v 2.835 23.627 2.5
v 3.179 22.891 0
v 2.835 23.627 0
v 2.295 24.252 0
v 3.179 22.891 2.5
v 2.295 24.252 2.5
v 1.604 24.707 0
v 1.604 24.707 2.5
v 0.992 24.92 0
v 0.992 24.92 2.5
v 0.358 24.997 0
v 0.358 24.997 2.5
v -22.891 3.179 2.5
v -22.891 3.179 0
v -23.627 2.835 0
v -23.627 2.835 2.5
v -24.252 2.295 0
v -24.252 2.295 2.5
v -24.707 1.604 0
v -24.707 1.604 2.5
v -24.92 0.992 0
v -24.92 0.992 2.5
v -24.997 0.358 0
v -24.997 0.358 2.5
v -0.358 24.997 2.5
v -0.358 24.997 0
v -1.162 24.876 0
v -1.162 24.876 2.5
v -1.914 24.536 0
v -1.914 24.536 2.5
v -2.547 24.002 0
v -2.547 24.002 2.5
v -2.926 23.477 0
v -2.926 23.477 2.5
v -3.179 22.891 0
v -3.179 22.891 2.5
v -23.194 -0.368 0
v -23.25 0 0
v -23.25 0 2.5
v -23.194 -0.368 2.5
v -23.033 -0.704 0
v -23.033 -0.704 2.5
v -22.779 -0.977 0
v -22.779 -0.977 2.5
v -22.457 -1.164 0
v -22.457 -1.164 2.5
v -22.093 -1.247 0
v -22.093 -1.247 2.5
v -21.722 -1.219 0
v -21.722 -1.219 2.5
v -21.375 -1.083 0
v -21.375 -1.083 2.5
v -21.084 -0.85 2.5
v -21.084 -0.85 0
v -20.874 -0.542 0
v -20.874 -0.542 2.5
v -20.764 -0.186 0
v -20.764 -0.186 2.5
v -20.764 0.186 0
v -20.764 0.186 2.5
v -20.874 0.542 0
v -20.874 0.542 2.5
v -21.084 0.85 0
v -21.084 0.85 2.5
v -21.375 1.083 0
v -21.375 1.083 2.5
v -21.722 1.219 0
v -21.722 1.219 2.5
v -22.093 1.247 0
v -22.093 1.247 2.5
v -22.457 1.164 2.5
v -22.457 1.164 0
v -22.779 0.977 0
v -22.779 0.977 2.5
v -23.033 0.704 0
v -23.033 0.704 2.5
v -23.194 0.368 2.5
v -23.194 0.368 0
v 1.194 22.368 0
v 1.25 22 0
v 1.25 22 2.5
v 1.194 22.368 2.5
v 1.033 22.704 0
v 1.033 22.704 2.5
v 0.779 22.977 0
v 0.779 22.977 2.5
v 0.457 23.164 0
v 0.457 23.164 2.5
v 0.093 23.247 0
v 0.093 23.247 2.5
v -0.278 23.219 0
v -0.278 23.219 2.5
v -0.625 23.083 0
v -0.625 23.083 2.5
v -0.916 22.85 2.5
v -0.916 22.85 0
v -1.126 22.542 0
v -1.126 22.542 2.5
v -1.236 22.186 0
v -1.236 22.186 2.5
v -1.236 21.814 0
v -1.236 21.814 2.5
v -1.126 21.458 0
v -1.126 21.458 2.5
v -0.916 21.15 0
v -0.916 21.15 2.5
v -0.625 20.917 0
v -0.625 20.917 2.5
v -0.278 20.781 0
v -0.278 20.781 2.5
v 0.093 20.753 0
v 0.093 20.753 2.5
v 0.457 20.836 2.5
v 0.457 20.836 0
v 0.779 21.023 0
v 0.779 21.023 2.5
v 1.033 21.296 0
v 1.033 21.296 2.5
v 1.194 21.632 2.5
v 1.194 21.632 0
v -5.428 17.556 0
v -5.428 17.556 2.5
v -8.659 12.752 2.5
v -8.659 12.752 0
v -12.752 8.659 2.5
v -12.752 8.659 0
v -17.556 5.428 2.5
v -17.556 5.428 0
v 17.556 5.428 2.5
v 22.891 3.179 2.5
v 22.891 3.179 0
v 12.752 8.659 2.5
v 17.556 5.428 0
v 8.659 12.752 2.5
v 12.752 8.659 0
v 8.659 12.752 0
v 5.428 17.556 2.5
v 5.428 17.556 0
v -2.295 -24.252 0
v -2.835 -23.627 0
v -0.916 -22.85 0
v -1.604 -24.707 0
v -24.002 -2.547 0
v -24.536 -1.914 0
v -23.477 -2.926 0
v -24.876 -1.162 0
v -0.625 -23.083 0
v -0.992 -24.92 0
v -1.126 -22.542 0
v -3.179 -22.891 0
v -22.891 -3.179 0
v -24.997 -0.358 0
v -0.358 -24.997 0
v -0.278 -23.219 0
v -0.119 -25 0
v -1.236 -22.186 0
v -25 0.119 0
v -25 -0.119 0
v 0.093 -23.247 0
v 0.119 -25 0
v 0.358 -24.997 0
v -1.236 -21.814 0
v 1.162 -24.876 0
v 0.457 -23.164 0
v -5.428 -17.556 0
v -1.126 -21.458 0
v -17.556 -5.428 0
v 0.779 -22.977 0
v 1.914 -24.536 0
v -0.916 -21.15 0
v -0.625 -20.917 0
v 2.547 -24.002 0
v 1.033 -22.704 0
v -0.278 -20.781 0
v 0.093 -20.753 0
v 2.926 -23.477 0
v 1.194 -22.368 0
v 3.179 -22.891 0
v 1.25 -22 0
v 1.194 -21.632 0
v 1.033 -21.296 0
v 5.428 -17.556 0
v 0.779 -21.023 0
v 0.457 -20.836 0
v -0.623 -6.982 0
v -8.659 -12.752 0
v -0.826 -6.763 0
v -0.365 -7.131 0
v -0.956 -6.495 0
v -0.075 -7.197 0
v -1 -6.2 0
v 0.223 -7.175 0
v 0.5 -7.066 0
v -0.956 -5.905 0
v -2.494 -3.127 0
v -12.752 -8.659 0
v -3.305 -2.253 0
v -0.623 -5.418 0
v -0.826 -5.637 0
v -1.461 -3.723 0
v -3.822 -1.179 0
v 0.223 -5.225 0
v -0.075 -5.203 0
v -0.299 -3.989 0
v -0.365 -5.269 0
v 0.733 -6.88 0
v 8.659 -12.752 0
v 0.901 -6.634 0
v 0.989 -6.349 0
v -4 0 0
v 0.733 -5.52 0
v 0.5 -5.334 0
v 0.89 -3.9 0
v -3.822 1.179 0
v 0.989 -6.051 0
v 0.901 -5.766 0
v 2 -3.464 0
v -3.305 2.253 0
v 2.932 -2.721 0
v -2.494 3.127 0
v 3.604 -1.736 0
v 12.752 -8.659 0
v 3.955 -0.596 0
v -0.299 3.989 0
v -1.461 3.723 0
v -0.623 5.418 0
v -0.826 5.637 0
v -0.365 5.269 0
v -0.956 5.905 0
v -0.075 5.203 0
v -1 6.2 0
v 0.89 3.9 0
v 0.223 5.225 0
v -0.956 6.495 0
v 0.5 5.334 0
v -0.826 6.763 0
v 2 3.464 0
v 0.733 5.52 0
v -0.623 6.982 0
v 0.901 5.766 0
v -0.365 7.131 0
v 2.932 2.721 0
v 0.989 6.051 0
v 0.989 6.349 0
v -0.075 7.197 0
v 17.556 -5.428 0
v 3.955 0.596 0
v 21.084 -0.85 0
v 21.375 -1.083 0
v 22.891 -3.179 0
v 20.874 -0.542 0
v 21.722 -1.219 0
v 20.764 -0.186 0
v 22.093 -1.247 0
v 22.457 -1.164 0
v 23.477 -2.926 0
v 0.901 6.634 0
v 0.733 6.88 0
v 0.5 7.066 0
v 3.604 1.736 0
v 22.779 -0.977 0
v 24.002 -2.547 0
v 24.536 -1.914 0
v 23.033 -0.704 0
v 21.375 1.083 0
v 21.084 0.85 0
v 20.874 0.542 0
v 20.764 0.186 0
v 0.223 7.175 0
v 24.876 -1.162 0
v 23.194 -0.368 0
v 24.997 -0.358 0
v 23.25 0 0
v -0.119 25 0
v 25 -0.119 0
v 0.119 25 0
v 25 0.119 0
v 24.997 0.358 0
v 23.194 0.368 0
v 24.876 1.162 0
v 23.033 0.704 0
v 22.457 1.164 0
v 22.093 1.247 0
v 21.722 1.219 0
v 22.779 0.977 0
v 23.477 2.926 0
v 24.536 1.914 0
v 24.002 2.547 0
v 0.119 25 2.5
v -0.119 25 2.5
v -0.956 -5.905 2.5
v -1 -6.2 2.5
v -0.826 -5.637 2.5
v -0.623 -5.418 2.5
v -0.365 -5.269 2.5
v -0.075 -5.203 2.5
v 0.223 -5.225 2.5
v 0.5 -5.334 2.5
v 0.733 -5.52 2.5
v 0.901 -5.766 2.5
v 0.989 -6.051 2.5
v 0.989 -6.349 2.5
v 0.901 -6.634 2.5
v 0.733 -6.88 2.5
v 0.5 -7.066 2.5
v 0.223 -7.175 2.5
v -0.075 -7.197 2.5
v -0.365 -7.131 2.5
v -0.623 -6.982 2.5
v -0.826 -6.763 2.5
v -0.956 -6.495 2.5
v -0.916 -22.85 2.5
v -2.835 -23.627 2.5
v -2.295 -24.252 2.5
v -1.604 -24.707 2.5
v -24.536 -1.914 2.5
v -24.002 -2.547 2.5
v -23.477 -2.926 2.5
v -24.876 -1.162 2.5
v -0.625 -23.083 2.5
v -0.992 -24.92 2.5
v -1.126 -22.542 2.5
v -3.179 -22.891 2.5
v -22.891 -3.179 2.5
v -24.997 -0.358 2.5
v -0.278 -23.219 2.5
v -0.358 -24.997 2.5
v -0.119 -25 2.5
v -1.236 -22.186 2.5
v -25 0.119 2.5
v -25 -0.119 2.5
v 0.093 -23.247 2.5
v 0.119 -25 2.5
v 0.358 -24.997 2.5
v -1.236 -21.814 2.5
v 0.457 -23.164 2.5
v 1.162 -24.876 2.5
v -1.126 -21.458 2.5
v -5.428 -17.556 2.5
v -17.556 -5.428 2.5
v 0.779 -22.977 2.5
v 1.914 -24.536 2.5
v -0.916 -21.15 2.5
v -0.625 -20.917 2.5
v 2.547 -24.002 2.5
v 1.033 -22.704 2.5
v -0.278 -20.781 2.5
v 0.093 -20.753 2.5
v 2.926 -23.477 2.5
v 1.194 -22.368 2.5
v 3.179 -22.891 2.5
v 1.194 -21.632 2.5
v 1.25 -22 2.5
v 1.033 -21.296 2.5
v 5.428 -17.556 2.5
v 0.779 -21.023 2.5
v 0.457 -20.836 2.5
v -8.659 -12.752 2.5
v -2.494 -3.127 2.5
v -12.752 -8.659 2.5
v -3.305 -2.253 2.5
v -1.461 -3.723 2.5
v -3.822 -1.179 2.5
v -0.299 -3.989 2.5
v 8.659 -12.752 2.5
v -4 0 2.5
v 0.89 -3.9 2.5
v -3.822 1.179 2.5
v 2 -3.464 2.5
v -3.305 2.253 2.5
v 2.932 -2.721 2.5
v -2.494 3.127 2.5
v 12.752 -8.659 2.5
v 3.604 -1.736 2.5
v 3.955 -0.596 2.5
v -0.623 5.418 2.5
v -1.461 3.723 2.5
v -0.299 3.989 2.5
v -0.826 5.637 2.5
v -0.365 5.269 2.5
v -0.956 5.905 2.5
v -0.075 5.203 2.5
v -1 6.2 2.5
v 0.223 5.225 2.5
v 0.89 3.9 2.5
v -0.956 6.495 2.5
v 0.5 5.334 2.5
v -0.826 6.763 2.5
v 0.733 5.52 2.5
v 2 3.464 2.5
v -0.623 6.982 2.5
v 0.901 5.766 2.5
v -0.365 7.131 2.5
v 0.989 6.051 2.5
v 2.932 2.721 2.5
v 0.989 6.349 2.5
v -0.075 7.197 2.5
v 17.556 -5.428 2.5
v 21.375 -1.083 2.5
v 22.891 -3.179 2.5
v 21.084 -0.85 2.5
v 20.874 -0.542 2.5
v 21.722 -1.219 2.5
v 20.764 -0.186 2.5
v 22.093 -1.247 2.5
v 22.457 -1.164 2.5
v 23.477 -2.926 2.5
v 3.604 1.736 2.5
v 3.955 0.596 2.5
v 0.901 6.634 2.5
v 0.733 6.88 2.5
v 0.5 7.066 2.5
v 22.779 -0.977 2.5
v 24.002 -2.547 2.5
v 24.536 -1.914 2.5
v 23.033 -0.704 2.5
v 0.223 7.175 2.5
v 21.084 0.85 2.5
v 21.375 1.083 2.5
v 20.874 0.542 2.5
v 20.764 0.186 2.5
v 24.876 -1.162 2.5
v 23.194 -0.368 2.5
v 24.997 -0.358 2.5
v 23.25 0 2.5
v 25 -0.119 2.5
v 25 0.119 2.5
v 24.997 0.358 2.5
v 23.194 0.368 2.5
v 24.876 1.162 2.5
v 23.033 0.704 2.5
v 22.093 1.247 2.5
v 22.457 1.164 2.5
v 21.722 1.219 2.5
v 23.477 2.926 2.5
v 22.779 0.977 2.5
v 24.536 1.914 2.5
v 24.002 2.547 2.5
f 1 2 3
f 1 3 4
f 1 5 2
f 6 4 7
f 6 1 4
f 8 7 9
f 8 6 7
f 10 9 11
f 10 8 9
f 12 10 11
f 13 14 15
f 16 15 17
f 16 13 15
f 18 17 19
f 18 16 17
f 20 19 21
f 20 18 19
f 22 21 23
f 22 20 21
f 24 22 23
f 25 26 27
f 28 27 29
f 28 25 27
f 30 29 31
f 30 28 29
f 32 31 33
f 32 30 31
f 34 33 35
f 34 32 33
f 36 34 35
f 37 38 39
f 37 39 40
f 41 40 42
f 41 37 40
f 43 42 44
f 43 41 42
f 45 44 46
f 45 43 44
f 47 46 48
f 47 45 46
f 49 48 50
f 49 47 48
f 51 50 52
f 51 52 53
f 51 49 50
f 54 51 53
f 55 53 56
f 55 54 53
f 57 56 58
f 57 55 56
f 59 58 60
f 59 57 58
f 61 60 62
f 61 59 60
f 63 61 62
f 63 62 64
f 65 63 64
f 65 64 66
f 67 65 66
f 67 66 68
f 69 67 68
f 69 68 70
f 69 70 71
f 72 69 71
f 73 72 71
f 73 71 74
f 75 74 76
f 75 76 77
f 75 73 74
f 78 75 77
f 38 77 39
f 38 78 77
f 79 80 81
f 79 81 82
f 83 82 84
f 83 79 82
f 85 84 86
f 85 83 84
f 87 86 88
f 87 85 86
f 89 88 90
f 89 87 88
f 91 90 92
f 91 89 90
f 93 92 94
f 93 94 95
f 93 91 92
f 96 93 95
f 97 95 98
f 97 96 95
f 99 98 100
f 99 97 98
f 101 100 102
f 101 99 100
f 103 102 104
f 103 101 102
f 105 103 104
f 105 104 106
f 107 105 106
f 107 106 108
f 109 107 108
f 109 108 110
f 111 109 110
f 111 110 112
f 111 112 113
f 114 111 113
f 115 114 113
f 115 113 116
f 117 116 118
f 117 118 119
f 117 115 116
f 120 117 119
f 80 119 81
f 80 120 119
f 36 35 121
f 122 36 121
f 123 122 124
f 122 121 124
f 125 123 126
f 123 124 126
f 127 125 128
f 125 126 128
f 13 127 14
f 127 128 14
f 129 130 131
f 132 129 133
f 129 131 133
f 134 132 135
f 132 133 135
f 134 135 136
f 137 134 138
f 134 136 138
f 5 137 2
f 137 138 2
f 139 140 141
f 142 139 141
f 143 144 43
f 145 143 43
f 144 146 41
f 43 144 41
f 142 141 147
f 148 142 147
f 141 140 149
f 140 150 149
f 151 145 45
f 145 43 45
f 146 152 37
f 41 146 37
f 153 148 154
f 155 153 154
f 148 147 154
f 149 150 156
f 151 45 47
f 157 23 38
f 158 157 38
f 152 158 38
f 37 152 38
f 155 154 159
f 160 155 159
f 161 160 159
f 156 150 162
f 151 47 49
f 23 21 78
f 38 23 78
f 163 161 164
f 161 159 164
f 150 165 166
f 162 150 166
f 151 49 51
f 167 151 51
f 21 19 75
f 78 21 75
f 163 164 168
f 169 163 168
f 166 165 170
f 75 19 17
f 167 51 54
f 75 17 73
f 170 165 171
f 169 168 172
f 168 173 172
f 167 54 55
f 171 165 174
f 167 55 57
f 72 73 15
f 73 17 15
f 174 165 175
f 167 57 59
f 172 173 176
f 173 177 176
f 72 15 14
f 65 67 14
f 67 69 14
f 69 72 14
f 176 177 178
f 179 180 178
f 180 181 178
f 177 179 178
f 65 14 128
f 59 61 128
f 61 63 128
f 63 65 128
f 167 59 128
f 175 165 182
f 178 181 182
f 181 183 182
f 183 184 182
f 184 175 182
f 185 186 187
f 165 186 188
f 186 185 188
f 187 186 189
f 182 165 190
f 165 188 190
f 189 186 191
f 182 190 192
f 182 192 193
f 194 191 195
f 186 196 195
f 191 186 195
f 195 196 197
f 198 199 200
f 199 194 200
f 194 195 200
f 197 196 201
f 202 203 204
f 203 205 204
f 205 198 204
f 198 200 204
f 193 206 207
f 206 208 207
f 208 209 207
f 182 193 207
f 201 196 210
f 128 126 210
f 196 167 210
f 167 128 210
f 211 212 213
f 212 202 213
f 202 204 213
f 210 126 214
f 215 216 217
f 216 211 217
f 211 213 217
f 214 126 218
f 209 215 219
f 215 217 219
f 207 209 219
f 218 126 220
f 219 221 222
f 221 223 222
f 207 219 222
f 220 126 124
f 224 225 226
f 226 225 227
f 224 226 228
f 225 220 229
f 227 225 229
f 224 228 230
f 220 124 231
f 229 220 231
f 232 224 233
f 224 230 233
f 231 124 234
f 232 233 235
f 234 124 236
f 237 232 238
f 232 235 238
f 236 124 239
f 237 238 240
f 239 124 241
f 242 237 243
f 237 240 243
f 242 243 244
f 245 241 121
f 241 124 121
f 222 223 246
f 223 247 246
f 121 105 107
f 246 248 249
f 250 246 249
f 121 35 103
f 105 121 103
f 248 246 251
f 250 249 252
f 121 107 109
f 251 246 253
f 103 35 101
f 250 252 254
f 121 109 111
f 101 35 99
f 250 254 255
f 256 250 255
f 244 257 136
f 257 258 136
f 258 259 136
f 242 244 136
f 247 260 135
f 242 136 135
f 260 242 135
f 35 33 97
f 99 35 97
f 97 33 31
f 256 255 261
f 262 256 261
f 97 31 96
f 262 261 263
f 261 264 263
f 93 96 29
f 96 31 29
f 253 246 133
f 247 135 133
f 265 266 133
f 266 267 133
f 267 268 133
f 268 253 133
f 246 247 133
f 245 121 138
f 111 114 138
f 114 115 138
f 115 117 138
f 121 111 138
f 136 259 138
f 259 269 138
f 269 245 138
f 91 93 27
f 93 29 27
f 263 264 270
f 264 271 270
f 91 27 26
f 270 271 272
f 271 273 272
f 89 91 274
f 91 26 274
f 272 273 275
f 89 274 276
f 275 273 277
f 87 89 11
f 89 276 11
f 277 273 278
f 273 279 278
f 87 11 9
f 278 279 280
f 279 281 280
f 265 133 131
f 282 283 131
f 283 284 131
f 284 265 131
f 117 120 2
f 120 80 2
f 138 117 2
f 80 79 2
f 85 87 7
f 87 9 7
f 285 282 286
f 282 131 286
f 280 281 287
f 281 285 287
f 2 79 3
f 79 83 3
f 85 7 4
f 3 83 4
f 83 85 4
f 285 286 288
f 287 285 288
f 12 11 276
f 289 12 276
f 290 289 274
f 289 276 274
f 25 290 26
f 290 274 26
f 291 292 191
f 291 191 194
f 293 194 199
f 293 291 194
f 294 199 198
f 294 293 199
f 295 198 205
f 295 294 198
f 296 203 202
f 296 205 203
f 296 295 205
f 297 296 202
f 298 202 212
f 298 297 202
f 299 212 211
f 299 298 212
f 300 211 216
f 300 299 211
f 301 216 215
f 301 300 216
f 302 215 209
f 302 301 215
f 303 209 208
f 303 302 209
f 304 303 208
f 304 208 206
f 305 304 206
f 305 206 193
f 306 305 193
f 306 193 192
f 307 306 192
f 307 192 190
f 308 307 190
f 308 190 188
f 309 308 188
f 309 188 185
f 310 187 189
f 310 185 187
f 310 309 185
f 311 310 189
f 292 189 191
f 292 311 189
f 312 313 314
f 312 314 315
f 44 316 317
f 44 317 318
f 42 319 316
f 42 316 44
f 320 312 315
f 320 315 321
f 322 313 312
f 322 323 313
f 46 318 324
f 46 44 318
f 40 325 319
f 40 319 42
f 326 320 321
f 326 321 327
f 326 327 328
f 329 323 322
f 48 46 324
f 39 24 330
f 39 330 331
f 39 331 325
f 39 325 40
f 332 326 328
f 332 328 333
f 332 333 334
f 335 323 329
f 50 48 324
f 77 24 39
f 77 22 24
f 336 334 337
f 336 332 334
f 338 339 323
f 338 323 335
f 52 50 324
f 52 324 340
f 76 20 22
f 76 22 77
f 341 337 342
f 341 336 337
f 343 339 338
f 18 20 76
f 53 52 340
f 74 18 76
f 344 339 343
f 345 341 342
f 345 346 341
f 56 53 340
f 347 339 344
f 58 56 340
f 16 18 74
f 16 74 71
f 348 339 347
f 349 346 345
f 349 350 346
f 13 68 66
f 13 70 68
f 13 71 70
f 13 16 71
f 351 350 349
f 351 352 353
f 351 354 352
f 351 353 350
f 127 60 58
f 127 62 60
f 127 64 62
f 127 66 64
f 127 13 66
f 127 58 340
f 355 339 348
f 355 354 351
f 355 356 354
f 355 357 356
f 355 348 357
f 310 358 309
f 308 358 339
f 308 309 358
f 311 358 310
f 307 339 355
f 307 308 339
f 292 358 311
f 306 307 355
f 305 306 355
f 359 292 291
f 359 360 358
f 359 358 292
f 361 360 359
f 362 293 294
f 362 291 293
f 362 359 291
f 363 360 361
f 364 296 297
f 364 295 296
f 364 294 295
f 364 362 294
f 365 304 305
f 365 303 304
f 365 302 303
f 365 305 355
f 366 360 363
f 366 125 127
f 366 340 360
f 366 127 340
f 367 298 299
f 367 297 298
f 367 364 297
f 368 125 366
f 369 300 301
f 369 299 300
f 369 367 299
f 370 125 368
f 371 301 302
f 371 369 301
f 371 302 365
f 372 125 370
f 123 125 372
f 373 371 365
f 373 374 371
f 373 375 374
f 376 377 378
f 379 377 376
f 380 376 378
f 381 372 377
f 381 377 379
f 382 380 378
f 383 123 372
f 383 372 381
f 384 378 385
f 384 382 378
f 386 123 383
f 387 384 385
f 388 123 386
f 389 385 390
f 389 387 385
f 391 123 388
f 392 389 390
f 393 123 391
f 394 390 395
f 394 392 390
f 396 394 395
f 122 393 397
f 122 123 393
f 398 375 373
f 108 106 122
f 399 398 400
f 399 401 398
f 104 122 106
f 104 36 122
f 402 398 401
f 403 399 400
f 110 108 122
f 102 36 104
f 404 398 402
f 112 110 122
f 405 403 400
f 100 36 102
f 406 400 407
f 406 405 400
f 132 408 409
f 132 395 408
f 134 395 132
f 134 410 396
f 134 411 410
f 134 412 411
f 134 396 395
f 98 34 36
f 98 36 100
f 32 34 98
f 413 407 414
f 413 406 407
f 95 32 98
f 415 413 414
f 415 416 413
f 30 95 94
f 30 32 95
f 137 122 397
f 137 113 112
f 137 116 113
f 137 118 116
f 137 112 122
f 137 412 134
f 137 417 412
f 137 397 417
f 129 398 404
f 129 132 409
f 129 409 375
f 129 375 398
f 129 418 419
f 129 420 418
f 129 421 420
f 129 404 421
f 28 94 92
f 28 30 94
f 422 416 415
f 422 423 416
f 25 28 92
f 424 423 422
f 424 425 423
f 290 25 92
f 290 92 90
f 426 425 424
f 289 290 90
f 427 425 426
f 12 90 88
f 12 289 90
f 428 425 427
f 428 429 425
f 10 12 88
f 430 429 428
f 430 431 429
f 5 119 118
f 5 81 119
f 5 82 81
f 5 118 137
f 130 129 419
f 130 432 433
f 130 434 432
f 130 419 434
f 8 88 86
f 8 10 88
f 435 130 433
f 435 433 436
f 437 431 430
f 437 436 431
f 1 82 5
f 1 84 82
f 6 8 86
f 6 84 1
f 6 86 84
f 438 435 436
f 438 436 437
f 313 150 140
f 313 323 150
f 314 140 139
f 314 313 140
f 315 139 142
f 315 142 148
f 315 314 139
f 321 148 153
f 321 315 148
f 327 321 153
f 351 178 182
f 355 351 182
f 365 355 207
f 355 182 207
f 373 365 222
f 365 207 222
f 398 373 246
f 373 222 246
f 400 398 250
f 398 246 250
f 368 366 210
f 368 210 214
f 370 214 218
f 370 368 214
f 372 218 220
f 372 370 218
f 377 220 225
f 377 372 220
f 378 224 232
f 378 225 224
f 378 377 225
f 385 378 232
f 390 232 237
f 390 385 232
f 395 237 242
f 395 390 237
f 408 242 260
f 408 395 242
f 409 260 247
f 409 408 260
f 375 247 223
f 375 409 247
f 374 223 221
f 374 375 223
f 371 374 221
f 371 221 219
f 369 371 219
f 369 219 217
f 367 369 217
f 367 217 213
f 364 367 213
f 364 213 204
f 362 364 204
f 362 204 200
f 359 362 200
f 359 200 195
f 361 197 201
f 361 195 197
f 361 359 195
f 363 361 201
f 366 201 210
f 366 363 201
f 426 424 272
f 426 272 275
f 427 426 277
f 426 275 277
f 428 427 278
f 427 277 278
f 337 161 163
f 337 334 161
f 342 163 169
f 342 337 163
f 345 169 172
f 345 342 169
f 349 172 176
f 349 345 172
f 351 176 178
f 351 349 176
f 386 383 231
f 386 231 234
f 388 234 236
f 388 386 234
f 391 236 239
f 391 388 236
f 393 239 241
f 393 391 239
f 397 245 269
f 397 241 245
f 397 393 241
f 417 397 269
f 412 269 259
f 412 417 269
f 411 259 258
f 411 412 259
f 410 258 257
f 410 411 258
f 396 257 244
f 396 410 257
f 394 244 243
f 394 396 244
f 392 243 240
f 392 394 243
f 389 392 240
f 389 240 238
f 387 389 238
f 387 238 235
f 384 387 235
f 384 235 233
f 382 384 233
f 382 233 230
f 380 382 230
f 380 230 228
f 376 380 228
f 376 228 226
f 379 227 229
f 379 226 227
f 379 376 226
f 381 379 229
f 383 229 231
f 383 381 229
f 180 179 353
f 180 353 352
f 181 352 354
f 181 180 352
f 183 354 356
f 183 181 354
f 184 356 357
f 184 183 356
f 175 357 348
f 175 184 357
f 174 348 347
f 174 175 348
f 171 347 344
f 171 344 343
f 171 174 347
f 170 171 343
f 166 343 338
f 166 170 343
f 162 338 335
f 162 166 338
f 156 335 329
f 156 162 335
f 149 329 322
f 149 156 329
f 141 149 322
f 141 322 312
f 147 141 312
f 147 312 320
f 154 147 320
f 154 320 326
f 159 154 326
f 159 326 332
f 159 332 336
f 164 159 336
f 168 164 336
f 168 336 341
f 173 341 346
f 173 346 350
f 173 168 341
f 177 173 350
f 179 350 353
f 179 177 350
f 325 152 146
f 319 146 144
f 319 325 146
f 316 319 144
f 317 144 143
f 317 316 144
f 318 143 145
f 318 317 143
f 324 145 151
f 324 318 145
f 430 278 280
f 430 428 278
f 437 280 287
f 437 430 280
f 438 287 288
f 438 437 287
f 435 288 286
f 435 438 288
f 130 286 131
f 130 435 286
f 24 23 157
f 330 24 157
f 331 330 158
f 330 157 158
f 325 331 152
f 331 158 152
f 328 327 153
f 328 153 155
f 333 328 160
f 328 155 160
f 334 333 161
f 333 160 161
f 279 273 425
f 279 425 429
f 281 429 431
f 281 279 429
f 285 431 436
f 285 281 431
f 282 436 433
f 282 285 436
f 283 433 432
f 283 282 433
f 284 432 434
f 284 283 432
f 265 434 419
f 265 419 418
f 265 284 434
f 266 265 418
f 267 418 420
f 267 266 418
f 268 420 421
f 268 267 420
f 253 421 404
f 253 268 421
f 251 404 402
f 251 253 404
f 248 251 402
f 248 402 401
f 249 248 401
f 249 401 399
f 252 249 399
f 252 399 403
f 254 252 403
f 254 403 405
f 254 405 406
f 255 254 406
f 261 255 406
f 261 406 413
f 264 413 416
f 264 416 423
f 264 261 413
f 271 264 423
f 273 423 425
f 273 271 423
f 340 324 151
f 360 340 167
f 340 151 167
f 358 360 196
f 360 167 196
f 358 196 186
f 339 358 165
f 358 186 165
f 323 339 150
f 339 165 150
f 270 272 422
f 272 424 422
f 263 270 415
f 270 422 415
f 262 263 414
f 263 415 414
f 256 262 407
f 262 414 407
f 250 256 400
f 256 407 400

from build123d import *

# Parameters (mm, degrees)
SKETCH_1_R               = 25
SKETCH_1_R_2             = 1.25
EXTRUDE_1_DEPTH          = 2.5
CUT_EXTRUDE_2_DEPTH      = 36.443617197
CUT_EXTRUDE_2_DEPTH_BACK = 36.443617197
SKETCH_3_R               = 1
SKETCH_3_R_2             = 4
CUT_EXTRUDE_5_DEPTH      = 10
FILLET_2_R               = 3


with BuildPart() as part:
    # 草图1 → 凸台-拉伸1 (new body)
    with BuildSketch(Plane.XY):
        Circle(SKETCH_1_R)
        with Locations((0, 22)):
            Circle(SKETCH_1_R_2, mode=Mode.SUBTRACT)
        with Locations((22, 0)):
            Circle(SKETCH_1_R_2, mode=Mode.SUBTRACT)
        with Locations((0, -22)):
            Circle(SKETCH_1_R_2, mode=Mode.SUBTRACT)
        with Locations(Location((-22, 0, 0), (0, 0, 180))):
            Circle(SKETCH_1_R_2, mode=Mode.SUBTRACT)
    extrude(amount=EXTRUDE_1_DEPTH)

    # 草图3 → 切除-拉伸2 (cut, two sides: drawn at the far end of the back side and taken through both)
    with BuildSketch(Plane(origin=(0, 0, 0), x_dir=(-1, 0, 0), z_dir=(0, 0, -1)).offset(-CUT_EXTRUDE_2_DEPTH_BACK)):
        with Locations((0, 6.2)):
            Circle(SKETCH_3_R)
        Circle(SKETCH_3_R_2)
        with Locations((0, -6.2)):
            Circle(SKETCH_3_R)
    extrude(amount=CUT_EXTRUDE_2_DEPTH + CUT_EXTRUDE_2_DEPTH_BACK, mode=Mode.SUBTRACT)

    # 草图5 → 切除-拉伸5 (cut)
    with BuildSketch(Plane(origin=(0, 0, 0), x_dir=(-1, 0, 0), z_dir=(0, 0, -1))):
        with BuildLine():
            ThreePointArc((-2.638187412, 24.860409634), (-17.67766953, 17.67766953), (-24.860409634, 2.638187412))
            ThreePointArc((-24.860409634, 2.638187412), (-10.606601718, 10.606601718), (-2.638187412, 24.860409634))
        make_face()
        with BuildLine():
            ThreePointArc((-2.638187412, -24.860409634), (-10.606601718, -10.606601718), (-24.860409634, -2.638187412))
            ThreePointArc((-24.860409634, -2.638187412), (-17.67766953, -17.67766953), (-2.638187412, -24.860409634))
        make_face()
        with BuildLine():
            ThreePointArc((24.860409634, -2.638187412), (10.606601718, -10.606601718), (2.638187412, -24.860409634))
            ThreePointArc((2.638187412, -24.860409634), (17.67766953, -17.67766953), (24.860409634, -2.638187412))
        make_face()
        with BuildLine():
            ThreePointArc((24.860409634, 2.638187412), (17.67766953, 17.67766953), (2.638187412, 24.860409634))
            ThreePointArc((2.638187412, 24.860409634), (10.606601718, 10.606601718), (24.860409634, 2.638187412))
        make_face()
    extrude(amount=-CUT_EXTRUDE_5_DEPTH, mode=Mode.SUBTRACT)

    # 圆角2
    fillet_2_edges = [part.edges().sort_by_distance(p)[0] for p in [
        (2.638187412, 24.860409634, 1.25),
        (24.860409634, 2.638187412, 1.25),
        (24.860409634, -2.638187412, 1.25),
        (2.638187412, -24.860409634, 1.25),
        (-2.638187412, -24.860409634, 1.25),
        (-24.860409634, -2.638187412, 1.25),
        (-24.860409634, 2.638187412, 1.25),
        (-2.638187412, 24.860409634, 1.25),
    ]]
    fillet(fillet_2_edges, radius=FILLET_2_R)


solid = part.part
